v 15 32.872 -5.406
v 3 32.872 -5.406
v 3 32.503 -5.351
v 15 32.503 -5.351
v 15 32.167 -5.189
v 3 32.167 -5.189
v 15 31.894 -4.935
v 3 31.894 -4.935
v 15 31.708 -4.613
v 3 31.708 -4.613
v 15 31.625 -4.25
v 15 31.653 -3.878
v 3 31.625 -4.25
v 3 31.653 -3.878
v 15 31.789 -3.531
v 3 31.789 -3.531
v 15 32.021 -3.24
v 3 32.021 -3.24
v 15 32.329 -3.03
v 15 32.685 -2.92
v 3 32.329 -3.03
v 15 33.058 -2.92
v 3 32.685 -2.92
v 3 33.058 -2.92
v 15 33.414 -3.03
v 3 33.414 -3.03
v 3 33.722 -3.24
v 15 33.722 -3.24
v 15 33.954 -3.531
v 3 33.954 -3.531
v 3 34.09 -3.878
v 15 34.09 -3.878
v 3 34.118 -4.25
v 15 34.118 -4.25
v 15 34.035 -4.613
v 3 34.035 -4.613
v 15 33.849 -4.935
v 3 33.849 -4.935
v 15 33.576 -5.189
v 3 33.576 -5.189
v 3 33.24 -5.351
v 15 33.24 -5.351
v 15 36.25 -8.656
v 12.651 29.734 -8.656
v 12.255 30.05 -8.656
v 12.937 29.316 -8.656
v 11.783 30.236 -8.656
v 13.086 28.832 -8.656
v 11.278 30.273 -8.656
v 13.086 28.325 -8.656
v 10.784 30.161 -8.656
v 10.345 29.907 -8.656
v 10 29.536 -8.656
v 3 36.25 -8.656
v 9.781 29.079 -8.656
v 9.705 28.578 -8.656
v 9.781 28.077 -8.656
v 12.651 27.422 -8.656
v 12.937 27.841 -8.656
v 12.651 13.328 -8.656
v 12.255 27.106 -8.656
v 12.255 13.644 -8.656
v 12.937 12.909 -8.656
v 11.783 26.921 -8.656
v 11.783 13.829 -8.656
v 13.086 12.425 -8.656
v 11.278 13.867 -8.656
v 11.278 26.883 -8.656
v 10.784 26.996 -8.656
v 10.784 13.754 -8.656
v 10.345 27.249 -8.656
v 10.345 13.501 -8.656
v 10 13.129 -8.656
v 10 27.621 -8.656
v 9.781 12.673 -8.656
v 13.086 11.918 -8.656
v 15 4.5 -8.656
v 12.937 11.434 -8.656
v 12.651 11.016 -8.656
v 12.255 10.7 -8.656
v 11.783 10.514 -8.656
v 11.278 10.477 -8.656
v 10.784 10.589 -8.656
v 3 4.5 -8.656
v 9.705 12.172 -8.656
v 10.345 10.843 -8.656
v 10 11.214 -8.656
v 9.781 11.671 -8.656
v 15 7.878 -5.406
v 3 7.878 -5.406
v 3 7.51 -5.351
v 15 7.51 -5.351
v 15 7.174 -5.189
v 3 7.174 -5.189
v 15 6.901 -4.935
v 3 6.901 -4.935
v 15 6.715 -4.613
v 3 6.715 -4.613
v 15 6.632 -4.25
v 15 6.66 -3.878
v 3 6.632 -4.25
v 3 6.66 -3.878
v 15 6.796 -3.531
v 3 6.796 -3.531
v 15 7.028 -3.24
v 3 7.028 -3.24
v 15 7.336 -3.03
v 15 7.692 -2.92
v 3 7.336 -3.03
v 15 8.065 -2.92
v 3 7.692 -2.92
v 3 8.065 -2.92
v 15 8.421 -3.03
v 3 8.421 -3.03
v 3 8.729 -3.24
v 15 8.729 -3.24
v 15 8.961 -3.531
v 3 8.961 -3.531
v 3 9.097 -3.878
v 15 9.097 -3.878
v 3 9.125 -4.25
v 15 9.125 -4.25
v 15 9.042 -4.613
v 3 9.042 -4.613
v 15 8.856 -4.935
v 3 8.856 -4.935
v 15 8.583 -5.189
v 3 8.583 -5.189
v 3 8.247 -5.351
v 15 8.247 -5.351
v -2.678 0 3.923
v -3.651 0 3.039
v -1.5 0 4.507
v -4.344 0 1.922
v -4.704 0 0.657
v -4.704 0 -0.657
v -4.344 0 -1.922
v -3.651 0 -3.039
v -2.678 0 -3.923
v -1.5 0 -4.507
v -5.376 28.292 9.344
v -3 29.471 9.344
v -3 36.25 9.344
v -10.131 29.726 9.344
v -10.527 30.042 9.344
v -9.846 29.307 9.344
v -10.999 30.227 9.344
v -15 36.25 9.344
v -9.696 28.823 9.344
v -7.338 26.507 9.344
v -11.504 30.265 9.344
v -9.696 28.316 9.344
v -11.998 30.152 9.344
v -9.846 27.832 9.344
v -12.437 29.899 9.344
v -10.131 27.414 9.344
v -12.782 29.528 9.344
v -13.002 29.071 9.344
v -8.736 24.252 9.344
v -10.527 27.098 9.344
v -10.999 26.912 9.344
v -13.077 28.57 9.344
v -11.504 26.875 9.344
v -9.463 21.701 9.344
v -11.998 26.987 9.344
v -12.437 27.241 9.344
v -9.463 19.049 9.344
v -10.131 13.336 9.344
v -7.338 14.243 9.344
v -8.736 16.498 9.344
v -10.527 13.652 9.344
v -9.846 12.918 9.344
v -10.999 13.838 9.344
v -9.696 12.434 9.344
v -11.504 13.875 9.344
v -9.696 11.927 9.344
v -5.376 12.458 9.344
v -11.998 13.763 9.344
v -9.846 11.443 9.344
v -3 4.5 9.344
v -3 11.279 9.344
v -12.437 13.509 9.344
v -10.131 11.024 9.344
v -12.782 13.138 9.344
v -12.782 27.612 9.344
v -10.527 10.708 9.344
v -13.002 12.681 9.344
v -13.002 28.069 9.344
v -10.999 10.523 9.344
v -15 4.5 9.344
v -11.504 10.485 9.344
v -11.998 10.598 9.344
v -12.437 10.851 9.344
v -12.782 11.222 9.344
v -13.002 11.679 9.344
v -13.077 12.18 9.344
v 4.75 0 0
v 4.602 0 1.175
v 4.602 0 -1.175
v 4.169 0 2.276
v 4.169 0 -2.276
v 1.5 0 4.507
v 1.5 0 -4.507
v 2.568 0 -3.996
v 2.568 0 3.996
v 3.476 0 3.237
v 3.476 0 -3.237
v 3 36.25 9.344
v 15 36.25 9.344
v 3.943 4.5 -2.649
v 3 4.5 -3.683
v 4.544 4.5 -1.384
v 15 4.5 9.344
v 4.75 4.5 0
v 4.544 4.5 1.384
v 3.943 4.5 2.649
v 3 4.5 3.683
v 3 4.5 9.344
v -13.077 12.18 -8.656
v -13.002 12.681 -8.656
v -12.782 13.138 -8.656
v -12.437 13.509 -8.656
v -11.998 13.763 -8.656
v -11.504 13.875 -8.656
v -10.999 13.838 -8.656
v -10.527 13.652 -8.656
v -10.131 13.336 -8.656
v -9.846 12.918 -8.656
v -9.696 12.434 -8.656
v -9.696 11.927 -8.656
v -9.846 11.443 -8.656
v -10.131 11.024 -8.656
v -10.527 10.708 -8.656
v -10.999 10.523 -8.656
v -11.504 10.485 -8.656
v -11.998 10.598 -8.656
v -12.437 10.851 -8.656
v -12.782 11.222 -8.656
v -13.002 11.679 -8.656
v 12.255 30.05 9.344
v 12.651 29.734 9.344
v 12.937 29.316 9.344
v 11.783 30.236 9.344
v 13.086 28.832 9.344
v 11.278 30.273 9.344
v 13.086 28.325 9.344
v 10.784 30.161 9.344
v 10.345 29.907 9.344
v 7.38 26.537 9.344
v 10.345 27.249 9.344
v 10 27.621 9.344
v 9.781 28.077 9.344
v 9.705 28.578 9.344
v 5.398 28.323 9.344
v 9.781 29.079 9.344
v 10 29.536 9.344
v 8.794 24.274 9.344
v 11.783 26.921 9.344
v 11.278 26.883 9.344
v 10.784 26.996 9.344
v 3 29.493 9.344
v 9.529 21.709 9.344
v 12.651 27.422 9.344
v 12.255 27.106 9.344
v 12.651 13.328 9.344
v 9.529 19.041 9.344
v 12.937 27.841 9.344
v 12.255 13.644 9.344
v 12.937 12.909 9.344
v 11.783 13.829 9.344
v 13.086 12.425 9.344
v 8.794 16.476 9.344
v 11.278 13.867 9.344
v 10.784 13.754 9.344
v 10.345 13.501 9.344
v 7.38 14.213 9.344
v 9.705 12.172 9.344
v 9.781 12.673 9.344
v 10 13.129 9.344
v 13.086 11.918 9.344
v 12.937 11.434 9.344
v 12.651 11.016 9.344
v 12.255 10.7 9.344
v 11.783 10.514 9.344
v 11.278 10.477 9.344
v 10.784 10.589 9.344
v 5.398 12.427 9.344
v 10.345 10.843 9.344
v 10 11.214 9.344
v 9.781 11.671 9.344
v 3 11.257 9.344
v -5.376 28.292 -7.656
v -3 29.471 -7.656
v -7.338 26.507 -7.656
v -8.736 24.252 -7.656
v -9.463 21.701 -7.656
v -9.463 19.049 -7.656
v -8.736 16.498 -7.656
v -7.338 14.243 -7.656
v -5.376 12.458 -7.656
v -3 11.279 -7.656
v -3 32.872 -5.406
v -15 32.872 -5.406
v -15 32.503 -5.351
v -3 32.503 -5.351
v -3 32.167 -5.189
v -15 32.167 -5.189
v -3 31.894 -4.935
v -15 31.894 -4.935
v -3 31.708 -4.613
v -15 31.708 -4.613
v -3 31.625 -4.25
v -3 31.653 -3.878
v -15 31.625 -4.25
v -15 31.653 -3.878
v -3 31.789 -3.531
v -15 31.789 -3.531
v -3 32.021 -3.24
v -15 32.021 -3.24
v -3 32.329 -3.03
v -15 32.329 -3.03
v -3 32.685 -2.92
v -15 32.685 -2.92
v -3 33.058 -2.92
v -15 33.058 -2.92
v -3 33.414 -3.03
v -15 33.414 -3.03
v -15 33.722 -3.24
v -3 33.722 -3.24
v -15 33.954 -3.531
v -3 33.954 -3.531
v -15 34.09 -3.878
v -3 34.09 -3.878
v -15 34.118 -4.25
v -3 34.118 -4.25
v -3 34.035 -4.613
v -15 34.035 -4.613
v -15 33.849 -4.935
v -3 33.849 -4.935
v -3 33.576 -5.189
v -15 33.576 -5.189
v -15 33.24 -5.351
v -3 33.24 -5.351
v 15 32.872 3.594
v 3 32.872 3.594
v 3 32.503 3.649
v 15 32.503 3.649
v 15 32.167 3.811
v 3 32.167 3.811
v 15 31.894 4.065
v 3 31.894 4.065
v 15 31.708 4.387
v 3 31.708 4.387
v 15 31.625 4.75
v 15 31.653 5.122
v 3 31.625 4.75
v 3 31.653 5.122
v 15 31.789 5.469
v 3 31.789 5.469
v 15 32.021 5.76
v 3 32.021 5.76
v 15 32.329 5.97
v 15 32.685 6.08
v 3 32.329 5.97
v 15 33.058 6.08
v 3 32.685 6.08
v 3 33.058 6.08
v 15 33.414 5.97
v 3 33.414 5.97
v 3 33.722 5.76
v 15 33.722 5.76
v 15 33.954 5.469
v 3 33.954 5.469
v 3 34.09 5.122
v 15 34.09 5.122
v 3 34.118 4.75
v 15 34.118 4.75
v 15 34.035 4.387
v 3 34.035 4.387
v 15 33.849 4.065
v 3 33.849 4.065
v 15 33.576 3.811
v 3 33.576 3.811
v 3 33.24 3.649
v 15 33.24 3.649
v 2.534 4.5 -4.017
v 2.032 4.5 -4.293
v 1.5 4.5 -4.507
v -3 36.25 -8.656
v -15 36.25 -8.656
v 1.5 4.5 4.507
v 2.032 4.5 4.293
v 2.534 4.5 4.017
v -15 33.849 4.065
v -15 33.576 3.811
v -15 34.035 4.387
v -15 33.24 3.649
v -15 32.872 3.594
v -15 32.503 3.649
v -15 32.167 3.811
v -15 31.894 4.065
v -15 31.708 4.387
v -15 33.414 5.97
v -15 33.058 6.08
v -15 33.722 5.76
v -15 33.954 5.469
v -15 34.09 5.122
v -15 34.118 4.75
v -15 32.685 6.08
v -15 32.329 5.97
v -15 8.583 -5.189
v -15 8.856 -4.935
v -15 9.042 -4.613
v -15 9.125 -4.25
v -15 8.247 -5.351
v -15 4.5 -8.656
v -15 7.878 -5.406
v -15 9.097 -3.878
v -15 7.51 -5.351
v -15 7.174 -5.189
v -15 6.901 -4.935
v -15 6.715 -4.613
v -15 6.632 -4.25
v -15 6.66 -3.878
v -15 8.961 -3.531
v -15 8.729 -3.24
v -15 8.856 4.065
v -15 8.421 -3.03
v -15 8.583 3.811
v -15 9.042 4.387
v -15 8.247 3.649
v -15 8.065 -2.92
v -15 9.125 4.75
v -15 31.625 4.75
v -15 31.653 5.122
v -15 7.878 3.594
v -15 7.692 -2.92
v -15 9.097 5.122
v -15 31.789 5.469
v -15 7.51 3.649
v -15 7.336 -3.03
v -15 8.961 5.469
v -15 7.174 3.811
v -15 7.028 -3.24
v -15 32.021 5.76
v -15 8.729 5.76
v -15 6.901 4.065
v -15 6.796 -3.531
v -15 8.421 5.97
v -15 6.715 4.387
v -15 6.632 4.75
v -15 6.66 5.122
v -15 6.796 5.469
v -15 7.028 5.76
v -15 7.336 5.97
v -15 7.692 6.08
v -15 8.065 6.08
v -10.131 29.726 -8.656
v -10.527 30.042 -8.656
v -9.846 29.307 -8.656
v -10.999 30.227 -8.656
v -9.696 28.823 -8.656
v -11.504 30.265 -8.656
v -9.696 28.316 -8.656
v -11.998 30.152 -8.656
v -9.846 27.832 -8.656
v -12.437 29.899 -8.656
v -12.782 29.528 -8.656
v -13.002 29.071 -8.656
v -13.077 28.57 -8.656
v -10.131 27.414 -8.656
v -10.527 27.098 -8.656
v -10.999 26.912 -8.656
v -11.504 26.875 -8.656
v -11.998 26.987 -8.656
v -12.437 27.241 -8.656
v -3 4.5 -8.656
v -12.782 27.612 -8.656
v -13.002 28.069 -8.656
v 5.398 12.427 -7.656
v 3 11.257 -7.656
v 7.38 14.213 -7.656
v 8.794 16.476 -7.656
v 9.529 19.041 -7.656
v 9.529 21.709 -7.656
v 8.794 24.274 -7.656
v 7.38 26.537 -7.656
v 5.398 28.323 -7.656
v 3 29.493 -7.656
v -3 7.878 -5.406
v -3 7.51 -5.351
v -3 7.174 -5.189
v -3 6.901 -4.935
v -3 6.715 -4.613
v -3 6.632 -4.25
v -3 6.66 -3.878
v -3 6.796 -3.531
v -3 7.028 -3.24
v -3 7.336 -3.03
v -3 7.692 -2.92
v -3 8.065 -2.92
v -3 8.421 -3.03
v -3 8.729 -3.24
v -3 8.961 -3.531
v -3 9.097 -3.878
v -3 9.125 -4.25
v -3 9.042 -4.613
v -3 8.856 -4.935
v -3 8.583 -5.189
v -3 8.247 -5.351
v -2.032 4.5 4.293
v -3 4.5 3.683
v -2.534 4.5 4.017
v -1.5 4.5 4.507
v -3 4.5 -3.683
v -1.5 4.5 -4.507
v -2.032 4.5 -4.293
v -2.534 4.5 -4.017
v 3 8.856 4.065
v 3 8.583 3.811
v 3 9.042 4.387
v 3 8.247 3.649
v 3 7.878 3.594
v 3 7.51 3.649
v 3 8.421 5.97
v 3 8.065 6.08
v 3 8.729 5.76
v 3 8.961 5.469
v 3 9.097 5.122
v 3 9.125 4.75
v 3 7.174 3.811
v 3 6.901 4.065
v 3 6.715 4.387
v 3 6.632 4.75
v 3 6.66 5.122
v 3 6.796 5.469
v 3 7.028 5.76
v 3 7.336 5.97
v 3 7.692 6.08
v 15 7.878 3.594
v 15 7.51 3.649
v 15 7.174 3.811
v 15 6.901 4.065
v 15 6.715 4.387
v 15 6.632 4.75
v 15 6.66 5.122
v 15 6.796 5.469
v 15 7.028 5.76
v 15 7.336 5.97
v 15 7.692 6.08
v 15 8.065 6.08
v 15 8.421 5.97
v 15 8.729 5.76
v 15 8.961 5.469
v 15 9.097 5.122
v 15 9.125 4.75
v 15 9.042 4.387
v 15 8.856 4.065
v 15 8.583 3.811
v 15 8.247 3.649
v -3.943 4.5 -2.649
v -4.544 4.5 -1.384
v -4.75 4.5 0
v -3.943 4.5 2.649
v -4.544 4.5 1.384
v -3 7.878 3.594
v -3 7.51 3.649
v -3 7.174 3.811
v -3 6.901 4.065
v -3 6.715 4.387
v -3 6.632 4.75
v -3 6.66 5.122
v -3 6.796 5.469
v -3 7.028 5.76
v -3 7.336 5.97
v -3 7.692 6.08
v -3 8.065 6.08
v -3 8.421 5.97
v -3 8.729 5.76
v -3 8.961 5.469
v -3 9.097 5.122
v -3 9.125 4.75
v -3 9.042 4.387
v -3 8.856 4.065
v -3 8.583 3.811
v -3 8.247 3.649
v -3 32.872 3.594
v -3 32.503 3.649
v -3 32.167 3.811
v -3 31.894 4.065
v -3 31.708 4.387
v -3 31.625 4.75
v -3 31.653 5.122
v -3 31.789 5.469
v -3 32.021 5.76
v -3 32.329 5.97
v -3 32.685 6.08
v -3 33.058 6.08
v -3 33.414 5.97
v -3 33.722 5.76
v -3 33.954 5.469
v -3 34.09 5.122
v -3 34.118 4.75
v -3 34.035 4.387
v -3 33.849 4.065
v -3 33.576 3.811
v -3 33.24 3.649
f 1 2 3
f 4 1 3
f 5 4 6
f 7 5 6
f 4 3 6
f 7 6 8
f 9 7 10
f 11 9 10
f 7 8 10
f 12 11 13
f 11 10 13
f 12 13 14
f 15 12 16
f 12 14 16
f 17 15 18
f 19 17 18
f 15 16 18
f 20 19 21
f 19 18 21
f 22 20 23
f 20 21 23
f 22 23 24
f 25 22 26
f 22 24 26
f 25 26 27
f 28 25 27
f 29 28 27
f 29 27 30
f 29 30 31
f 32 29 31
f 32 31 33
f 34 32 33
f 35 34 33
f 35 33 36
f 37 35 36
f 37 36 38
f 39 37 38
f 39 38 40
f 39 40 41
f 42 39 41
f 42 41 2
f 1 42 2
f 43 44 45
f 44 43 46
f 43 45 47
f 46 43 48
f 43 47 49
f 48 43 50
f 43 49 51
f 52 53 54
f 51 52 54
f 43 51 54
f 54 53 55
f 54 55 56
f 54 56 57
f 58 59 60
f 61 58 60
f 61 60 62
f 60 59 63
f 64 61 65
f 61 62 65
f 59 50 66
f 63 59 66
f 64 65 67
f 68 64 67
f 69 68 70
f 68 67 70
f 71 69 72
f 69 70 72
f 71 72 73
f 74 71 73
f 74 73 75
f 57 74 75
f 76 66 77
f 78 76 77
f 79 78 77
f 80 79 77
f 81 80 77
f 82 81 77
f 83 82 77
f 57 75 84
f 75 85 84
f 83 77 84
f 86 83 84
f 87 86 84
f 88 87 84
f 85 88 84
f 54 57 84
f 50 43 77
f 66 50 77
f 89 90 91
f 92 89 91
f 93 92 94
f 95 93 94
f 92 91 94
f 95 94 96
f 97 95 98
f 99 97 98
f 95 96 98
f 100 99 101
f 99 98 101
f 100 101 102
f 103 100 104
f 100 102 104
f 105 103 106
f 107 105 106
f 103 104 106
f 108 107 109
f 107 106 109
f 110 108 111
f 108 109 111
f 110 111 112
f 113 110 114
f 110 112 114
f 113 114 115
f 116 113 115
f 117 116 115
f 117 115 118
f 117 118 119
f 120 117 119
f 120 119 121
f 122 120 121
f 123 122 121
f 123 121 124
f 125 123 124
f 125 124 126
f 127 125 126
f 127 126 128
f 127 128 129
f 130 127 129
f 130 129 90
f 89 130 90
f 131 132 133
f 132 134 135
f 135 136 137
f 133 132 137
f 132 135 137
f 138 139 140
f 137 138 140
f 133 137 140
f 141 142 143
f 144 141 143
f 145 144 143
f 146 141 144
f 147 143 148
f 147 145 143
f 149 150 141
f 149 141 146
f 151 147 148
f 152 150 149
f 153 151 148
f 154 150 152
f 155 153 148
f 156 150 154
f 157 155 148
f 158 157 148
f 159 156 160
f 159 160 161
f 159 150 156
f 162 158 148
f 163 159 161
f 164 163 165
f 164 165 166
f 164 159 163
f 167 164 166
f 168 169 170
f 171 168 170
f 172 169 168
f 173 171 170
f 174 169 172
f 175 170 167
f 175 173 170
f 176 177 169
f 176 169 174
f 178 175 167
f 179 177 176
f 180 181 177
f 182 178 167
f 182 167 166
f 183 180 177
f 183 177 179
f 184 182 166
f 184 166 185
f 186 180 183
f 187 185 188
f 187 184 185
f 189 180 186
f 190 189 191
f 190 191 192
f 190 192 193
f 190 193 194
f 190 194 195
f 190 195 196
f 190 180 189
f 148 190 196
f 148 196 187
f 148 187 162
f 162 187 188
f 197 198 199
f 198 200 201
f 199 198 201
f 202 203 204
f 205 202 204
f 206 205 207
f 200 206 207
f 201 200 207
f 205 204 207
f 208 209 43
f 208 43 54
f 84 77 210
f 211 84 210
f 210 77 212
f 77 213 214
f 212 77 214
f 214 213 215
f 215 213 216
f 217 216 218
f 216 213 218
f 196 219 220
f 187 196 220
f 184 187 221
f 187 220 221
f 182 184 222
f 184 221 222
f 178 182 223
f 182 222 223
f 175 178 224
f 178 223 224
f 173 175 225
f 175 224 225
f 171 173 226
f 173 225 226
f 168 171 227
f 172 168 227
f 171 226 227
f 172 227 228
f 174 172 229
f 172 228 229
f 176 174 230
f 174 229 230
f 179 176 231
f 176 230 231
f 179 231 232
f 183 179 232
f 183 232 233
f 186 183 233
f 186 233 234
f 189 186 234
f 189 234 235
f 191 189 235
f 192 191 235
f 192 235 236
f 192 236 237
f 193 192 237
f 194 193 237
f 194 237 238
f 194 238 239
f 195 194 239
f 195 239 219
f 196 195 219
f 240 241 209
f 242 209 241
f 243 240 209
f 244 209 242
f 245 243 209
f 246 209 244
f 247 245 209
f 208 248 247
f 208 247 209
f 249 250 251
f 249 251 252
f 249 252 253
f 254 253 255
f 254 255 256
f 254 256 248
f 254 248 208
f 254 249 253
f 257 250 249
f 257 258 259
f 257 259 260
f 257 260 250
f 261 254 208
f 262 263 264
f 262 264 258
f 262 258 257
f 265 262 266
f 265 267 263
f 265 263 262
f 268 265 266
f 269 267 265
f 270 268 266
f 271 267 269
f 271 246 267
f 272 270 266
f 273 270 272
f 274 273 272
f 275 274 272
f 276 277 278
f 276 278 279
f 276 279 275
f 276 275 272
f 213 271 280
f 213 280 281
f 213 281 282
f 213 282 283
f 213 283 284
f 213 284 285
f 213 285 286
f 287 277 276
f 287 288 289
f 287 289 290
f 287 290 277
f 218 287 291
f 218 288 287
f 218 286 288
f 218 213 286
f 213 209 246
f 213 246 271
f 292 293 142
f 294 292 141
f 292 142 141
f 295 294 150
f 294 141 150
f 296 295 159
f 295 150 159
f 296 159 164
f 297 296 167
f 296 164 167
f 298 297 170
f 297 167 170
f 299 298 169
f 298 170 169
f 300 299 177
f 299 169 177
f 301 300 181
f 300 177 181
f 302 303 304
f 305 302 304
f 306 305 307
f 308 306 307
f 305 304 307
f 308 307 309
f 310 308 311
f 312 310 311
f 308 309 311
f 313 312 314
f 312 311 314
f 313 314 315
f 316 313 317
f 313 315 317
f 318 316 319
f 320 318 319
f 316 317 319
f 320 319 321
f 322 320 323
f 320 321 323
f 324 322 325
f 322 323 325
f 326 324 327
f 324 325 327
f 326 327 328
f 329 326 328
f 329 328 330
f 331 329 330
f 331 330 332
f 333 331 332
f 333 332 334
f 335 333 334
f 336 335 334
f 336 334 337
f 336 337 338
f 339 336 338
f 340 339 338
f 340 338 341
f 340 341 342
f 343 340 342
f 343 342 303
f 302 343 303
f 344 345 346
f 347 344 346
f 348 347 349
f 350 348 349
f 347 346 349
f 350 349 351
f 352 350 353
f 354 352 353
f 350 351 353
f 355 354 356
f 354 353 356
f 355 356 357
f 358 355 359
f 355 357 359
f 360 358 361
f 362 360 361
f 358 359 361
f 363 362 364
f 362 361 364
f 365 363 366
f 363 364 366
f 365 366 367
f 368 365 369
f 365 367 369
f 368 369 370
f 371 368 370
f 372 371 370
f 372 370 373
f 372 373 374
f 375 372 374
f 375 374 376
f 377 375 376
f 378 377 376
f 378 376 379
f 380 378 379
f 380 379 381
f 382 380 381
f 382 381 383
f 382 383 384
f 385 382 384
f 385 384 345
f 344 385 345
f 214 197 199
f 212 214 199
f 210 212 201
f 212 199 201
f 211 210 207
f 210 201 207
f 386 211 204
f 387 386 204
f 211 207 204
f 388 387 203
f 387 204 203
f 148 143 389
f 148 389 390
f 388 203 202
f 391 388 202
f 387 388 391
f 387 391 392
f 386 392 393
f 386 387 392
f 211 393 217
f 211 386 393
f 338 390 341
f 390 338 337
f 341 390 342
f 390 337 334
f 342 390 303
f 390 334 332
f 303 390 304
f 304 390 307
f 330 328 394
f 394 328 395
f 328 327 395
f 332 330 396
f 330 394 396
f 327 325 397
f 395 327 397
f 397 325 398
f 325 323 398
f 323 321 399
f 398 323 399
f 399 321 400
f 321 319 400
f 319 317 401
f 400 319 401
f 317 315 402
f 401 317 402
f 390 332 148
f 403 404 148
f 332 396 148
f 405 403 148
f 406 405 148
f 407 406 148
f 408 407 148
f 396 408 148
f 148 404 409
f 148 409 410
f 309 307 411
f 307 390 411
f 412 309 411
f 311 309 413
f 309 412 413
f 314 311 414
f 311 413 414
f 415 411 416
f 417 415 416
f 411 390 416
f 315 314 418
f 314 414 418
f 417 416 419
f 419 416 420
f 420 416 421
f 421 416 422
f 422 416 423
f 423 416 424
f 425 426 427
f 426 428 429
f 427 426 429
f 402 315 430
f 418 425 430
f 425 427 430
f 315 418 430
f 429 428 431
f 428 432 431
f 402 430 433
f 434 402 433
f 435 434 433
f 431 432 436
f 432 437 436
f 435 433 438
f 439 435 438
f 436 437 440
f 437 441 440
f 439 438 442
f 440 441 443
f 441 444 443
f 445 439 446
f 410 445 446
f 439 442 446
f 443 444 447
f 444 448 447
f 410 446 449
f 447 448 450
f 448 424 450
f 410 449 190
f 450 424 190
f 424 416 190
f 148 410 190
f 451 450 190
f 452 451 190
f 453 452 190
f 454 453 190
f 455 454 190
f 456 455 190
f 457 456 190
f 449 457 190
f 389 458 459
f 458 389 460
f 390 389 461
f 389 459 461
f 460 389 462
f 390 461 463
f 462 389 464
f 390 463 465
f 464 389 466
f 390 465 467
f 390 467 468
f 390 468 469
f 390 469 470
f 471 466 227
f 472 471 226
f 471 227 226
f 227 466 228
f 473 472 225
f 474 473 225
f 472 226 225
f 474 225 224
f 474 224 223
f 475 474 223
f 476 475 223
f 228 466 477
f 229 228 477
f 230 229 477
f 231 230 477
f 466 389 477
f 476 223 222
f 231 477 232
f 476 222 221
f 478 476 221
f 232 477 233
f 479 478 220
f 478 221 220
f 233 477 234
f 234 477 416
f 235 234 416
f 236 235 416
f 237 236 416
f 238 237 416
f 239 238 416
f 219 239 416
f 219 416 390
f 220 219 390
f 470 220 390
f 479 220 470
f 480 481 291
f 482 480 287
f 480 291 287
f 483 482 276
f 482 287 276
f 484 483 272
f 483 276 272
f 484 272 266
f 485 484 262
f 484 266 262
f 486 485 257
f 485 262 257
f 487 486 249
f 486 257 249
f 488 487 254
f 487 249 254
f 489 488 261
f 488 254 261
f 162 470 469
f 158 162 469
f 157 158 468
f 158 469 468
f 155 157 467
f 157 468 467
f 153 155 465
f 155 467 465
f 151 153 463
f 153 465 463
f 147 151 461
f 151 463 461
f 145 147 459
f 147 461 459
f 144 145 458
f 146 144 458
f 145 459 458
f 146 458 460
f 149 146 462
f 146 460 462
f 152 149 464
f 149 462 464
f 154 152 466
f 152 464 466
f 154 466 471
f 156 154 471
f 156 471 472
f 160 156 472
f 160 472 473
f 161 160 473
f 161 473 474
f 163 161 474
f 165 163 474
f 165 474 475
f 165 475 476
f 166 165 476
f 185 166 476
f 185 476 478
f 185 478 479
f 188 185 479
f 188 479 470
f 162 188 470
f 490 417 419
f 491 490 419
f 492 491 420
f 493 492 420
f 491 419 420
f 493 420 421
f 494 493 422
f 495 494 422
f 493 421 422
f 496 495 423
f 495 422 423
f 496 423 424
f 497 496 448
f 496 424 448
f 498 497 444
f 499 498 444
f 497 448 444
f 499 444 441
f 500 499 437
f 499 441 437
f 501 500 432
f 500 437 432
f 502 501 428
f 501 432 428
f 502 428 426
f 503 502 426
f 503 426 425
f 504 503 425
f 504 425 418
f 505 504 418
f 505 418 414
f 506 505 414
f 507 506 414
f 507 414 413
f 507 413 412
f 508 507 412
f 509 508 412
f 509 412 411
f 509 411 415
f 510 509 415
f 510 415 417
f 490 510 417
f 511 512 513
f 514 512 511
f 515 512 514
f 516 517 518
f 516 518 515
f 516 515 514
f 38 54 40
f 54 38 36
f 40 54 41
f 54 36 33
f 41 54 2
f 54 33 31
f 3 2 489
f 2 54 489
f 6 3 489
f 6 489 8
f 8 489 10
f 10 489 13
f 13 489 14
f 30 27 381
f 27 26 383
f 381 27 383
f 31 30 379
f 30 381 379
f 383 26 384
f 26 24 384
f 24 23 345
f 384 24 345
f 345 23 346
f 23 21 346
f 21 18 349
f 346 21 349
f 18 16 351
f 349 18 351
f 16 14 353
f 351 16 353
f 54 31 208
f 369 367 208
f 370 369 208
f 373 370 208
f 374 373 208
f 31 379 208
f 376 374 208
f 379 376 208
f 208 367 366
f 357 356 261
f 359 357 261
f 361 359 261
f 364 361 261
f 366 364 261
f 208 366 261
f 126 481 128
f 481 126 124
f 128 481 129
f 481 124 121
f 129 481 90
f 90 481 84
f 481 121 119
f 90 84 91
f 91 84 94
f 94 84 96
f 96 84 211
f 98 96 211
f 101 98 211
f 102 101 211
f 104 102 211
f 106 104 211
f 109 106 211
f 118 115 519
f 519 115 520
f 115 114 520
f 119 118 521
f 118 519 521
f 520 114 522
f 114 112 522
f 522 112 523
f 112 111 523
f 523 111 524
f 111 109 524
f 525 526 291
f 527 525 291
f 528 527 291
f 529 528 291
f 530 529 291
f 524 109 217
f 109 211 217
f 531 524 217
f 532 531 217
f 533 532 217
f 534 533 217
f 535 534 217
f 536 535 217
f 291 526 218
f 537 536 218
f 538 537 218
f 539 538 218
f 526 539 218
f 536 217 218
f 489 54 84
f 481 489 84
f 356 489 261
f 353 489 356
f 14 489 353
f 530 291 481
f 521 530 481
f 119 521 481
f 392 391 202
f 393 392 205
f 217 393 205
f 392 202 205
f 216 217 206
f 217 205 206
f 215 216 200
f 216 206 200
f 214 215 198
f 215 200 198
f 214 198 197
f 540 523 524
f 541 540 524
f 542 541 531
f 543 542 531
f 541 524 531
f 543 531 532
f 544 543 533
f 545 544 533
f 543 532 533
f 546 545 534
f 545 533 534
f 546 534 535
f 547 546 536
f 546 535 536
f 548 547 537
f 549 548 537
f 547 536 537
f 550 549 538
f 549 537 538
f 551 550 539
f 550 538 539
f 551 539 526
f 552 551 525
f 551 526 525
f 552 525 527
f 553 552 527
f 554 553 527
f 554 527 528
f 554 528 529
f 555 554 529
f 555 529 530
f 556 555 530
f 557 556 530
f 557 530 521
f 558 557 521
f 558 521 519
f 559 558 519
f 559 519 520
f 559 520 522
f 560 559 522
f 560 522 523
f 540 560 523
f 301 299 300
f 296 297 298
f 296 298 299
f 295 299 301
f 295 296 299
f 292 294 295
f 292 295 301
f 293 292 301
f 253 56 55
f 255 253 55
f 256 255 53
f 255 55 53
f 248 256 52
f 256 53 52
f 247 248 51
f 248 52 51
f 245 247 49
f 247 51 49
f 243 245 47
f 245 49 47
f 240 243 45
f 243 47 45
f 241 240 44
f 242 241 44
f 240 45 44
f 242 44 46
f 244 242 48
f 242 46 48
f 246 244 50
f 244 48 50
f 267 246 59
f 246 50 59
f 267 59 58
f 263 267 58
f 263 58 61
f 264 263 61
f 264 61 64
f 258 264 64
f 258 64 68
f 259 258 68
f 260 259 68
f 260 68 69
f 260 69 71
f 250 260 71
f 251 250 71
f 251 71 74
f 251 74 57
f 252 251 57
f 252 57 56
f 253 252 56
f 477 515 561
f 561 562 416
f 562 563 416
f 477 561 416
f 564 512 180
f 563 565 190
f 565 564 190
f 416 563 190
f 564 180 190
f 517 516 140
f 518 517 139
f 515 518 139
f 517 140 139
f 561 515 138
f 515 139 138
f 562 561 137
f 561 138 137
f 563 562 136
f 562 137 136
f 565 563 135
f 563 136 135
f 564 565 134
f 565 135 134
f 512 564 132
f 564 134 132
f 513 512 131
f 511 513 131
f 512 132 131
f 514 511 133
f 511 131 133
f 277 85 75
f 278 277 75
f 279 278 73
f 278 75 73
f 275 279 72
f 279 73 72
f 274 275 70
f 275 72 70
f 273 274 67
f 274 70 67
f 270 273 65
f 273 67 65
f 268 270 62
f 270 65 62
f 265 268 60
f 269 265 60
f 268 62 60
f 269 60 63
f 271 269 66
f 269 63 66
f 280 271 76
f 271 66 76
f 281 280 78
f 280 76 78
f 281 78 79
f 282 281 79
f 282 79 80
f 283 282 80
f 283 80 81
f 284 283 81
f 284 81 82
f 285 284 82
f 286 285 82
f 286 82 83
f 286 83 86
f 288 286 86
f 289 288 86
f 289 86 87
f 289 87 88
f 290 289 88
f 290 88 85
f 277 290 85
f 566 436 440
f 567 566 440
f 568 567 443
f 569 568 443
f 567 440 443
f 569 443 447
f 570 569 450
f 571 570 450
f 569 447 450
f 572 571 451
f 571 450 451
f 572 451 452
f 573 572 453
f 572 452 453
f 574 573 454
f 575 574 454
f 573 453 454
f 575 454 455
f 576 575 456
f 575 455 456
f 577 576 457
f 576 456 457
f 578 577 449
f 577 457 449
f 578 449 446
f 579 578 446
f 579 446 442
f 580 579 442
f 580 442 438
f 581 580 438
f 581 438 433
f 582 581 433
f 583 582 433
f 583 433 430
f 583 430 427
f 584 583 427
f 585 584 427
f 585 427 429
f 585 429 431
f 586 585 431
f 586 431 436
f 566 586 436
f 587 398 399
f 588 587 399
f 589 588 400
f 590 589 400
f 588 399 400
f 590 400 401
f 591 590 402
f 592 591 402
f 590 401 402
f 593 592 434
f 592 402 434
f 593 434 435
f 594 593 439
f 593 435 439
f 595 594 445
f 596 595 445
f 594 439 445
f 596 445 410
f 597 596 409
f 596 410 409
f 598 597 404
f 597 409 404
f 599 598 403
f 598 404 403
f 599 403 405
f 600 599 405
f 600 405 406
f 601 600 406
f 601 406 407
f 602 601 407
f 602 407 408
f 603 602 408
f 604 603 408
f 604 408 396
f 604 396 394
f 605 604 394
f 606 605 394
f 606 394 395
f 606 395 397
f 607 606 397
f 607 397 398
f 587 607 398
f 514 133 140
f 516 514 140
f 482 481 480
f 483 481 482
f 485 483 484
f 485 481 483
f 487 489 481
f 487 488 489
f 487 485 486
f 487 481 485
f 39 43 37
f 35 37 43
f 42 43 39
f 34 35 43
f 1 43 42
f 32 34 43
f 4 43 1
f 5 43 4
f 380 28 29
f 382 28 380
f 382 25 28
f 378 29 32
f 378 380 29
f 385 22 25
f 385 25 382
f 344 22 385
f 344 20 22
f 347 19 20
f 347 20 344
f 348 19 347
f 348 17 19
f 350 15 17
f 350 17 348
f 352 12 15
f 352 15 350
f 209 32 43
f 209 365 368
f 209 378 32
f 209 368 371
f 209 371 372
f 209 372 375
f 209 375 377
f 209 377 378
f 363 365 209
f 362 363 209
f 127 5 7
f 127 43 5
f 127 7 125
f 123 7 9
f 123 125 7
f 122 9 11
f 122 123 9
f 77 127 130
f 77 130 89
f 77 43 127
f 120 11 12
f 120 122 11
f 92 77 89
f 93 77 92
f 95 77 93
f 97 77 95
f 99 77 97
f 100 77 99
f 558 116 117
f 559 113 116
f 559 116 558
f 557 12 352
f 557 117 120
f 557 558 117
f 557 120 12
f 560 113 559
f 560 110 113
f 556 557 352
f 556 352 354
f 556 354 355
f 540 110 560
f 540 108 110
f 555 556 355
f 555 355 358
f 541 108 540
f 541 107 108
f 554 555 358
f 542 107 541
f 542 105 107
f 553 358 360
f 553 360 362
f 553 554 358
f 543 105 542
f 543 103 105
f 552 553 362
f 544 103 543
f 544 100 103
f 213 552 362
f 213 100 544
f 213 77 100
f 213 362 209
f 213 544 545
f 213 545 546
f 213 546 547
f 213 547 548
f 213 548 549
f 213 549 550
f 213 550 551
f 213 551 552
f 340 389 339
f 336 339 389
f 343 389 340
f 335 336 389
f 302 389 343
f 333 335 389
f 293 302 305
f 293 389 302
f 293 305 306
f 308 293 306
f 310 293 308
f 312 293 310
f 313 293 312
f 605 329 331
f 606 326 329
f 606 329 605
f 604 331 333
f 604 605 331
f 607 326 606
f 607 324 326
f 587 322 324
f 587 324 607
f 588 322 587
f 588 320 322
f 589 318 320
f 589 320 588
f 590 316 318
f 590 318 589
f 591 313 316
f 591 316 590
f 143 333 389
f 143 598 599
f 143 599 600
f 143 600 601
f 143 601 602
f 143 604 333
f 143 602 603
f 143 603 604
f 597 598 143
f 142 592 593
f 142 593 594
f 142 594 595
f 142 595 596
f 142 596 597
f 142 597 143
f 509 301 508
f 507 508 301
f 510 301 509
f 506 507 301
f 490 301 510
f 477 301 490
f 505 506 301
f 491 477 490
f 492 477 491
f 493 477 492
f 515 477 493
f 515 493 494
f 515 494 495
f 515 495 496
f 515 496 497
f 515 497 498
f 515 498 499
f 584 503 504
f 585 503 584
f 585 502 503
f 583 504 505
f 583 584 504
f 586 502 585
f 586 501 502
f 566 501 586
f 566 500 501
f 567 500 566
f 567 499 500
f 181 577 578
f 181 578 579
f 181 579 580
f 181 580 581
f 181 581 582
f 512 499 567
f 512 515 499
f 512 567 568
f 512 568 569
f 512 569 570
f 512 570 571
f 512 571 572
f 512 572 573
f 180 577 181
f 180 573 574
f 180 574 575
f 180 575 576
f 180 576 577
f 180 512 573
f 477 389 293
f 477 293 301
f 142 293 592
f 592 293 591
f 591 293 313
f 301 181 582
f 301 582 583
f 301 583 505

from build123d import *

# Parameters (mm, degrees)
SKETCH2_W             = 12
SKETCH2_H             = 18
EXTRUDE1_DEPTH        = 31.75
EXTRUDE1_2_DEPTH      = 31.75
EXTRUDE2_DEPTH        = 4.5
SKETCH4_R             = 9.5885
EXTRUDE3_DEPTH        = 17
M3X0_5_TAPPED_HOLE1_D = 2.5
M3_CLEARANCE_HOLE1_D  = 3.4


with BuildPart() as part:
    # Sketch2 → Extrude1 (new body)
    with BuildSketch(Plane(origin=(0, 4.5, 0), x_dir=(-1, 0, 0), z_dir=(0, 1, 0))):
        with Locations((9, 0.343878918)):
            Rectangle(SKETCH2_W, SKETCH2_H)
    extrude(amount=EXTRUDE1_DEPTH)



with BuildPart() as body_2:
    # Sketch2 → Extrude1 2 (new body)
    with BuildSketch(Plane(origin=(0, 4.5, 0), x_dir=(-1, 0, 0), z_dir=(0, 1, 0))):
        with Locations((-9, 0.343878918)):
            Rectangle(SKETCH2_W, SKETCH2_H)
    extrude(amount=EXTRUDE1_2_DEPTH)


with BuildPart() as part_1:
    add(part.part)

    add(body_2.part)  # Extrude2 merges body 2
    # Sketch1 → Extrude2 (add)
    with BuildSketch(Plane(origin=(0, 0, 0), x_dir=(1, 0, 0), z_dir=(0, 1, 0))):
        with BuildLine():
            ThreePointArc((4.75, 0), (3.852758752, 2.778263846), (1.5, 4.506939094))
            Line((1.5, 4.506939094), (1.5, -4.506939094))
            ThreePointArc((1.5, -4.506939094), (3.852758752, -2.778263846), (4.75, 0))
        make_face()
        with BuildLine():
            Line((-1.5, -4.506939094), (-1.5, 4.506939094))
            ThreePointArc((-1.5, 4.506939094), (-4.75, 0), (-1.5, -4.506939094))
        make_face()
    extrude(amount=EXTRUDE2_DEPTH)

    # Sketch4 → Extrude3 (cut)
    with BuildSketch(Plane.XY.offset(9.343878918)):
        with Locations((0.033766691, 20.375)):
            Circle(SKETCH4_R)
    extrude(amount=-EXTRUDE3_DEPTH, mode=Mode.SUBTRACT)

    # M3x0.5 Tapped Hole1 (through all)
    with Locations(Plane(origin=(15, 32.871578641, 4.843878918), x_dir=(0, 0, 1), z_dir=(1, 0, 0))):
        with Locations((0, 0), (-9, 0), (0, 24.993157282), (-9, 24.993157282)):
            Hole(M3X0_5_TAPPED_HOLE1_D / 2)

    # M3 Clearance Hole1 (through all)
    with Locations(Plane(origin=(-11.377218639, 28.569859147, 9.343878918), x_dir=(1, 0, 0), z_dir=(0, 0, 1))):
        with Locations((0, 0), (0, -16.389718294), (22.782225349, -16.398024537), (22.782225349, 0.008306243)):
            Hole(M3_CLEARANCE_HOLE1_D / 2)


solid = part_1.part
